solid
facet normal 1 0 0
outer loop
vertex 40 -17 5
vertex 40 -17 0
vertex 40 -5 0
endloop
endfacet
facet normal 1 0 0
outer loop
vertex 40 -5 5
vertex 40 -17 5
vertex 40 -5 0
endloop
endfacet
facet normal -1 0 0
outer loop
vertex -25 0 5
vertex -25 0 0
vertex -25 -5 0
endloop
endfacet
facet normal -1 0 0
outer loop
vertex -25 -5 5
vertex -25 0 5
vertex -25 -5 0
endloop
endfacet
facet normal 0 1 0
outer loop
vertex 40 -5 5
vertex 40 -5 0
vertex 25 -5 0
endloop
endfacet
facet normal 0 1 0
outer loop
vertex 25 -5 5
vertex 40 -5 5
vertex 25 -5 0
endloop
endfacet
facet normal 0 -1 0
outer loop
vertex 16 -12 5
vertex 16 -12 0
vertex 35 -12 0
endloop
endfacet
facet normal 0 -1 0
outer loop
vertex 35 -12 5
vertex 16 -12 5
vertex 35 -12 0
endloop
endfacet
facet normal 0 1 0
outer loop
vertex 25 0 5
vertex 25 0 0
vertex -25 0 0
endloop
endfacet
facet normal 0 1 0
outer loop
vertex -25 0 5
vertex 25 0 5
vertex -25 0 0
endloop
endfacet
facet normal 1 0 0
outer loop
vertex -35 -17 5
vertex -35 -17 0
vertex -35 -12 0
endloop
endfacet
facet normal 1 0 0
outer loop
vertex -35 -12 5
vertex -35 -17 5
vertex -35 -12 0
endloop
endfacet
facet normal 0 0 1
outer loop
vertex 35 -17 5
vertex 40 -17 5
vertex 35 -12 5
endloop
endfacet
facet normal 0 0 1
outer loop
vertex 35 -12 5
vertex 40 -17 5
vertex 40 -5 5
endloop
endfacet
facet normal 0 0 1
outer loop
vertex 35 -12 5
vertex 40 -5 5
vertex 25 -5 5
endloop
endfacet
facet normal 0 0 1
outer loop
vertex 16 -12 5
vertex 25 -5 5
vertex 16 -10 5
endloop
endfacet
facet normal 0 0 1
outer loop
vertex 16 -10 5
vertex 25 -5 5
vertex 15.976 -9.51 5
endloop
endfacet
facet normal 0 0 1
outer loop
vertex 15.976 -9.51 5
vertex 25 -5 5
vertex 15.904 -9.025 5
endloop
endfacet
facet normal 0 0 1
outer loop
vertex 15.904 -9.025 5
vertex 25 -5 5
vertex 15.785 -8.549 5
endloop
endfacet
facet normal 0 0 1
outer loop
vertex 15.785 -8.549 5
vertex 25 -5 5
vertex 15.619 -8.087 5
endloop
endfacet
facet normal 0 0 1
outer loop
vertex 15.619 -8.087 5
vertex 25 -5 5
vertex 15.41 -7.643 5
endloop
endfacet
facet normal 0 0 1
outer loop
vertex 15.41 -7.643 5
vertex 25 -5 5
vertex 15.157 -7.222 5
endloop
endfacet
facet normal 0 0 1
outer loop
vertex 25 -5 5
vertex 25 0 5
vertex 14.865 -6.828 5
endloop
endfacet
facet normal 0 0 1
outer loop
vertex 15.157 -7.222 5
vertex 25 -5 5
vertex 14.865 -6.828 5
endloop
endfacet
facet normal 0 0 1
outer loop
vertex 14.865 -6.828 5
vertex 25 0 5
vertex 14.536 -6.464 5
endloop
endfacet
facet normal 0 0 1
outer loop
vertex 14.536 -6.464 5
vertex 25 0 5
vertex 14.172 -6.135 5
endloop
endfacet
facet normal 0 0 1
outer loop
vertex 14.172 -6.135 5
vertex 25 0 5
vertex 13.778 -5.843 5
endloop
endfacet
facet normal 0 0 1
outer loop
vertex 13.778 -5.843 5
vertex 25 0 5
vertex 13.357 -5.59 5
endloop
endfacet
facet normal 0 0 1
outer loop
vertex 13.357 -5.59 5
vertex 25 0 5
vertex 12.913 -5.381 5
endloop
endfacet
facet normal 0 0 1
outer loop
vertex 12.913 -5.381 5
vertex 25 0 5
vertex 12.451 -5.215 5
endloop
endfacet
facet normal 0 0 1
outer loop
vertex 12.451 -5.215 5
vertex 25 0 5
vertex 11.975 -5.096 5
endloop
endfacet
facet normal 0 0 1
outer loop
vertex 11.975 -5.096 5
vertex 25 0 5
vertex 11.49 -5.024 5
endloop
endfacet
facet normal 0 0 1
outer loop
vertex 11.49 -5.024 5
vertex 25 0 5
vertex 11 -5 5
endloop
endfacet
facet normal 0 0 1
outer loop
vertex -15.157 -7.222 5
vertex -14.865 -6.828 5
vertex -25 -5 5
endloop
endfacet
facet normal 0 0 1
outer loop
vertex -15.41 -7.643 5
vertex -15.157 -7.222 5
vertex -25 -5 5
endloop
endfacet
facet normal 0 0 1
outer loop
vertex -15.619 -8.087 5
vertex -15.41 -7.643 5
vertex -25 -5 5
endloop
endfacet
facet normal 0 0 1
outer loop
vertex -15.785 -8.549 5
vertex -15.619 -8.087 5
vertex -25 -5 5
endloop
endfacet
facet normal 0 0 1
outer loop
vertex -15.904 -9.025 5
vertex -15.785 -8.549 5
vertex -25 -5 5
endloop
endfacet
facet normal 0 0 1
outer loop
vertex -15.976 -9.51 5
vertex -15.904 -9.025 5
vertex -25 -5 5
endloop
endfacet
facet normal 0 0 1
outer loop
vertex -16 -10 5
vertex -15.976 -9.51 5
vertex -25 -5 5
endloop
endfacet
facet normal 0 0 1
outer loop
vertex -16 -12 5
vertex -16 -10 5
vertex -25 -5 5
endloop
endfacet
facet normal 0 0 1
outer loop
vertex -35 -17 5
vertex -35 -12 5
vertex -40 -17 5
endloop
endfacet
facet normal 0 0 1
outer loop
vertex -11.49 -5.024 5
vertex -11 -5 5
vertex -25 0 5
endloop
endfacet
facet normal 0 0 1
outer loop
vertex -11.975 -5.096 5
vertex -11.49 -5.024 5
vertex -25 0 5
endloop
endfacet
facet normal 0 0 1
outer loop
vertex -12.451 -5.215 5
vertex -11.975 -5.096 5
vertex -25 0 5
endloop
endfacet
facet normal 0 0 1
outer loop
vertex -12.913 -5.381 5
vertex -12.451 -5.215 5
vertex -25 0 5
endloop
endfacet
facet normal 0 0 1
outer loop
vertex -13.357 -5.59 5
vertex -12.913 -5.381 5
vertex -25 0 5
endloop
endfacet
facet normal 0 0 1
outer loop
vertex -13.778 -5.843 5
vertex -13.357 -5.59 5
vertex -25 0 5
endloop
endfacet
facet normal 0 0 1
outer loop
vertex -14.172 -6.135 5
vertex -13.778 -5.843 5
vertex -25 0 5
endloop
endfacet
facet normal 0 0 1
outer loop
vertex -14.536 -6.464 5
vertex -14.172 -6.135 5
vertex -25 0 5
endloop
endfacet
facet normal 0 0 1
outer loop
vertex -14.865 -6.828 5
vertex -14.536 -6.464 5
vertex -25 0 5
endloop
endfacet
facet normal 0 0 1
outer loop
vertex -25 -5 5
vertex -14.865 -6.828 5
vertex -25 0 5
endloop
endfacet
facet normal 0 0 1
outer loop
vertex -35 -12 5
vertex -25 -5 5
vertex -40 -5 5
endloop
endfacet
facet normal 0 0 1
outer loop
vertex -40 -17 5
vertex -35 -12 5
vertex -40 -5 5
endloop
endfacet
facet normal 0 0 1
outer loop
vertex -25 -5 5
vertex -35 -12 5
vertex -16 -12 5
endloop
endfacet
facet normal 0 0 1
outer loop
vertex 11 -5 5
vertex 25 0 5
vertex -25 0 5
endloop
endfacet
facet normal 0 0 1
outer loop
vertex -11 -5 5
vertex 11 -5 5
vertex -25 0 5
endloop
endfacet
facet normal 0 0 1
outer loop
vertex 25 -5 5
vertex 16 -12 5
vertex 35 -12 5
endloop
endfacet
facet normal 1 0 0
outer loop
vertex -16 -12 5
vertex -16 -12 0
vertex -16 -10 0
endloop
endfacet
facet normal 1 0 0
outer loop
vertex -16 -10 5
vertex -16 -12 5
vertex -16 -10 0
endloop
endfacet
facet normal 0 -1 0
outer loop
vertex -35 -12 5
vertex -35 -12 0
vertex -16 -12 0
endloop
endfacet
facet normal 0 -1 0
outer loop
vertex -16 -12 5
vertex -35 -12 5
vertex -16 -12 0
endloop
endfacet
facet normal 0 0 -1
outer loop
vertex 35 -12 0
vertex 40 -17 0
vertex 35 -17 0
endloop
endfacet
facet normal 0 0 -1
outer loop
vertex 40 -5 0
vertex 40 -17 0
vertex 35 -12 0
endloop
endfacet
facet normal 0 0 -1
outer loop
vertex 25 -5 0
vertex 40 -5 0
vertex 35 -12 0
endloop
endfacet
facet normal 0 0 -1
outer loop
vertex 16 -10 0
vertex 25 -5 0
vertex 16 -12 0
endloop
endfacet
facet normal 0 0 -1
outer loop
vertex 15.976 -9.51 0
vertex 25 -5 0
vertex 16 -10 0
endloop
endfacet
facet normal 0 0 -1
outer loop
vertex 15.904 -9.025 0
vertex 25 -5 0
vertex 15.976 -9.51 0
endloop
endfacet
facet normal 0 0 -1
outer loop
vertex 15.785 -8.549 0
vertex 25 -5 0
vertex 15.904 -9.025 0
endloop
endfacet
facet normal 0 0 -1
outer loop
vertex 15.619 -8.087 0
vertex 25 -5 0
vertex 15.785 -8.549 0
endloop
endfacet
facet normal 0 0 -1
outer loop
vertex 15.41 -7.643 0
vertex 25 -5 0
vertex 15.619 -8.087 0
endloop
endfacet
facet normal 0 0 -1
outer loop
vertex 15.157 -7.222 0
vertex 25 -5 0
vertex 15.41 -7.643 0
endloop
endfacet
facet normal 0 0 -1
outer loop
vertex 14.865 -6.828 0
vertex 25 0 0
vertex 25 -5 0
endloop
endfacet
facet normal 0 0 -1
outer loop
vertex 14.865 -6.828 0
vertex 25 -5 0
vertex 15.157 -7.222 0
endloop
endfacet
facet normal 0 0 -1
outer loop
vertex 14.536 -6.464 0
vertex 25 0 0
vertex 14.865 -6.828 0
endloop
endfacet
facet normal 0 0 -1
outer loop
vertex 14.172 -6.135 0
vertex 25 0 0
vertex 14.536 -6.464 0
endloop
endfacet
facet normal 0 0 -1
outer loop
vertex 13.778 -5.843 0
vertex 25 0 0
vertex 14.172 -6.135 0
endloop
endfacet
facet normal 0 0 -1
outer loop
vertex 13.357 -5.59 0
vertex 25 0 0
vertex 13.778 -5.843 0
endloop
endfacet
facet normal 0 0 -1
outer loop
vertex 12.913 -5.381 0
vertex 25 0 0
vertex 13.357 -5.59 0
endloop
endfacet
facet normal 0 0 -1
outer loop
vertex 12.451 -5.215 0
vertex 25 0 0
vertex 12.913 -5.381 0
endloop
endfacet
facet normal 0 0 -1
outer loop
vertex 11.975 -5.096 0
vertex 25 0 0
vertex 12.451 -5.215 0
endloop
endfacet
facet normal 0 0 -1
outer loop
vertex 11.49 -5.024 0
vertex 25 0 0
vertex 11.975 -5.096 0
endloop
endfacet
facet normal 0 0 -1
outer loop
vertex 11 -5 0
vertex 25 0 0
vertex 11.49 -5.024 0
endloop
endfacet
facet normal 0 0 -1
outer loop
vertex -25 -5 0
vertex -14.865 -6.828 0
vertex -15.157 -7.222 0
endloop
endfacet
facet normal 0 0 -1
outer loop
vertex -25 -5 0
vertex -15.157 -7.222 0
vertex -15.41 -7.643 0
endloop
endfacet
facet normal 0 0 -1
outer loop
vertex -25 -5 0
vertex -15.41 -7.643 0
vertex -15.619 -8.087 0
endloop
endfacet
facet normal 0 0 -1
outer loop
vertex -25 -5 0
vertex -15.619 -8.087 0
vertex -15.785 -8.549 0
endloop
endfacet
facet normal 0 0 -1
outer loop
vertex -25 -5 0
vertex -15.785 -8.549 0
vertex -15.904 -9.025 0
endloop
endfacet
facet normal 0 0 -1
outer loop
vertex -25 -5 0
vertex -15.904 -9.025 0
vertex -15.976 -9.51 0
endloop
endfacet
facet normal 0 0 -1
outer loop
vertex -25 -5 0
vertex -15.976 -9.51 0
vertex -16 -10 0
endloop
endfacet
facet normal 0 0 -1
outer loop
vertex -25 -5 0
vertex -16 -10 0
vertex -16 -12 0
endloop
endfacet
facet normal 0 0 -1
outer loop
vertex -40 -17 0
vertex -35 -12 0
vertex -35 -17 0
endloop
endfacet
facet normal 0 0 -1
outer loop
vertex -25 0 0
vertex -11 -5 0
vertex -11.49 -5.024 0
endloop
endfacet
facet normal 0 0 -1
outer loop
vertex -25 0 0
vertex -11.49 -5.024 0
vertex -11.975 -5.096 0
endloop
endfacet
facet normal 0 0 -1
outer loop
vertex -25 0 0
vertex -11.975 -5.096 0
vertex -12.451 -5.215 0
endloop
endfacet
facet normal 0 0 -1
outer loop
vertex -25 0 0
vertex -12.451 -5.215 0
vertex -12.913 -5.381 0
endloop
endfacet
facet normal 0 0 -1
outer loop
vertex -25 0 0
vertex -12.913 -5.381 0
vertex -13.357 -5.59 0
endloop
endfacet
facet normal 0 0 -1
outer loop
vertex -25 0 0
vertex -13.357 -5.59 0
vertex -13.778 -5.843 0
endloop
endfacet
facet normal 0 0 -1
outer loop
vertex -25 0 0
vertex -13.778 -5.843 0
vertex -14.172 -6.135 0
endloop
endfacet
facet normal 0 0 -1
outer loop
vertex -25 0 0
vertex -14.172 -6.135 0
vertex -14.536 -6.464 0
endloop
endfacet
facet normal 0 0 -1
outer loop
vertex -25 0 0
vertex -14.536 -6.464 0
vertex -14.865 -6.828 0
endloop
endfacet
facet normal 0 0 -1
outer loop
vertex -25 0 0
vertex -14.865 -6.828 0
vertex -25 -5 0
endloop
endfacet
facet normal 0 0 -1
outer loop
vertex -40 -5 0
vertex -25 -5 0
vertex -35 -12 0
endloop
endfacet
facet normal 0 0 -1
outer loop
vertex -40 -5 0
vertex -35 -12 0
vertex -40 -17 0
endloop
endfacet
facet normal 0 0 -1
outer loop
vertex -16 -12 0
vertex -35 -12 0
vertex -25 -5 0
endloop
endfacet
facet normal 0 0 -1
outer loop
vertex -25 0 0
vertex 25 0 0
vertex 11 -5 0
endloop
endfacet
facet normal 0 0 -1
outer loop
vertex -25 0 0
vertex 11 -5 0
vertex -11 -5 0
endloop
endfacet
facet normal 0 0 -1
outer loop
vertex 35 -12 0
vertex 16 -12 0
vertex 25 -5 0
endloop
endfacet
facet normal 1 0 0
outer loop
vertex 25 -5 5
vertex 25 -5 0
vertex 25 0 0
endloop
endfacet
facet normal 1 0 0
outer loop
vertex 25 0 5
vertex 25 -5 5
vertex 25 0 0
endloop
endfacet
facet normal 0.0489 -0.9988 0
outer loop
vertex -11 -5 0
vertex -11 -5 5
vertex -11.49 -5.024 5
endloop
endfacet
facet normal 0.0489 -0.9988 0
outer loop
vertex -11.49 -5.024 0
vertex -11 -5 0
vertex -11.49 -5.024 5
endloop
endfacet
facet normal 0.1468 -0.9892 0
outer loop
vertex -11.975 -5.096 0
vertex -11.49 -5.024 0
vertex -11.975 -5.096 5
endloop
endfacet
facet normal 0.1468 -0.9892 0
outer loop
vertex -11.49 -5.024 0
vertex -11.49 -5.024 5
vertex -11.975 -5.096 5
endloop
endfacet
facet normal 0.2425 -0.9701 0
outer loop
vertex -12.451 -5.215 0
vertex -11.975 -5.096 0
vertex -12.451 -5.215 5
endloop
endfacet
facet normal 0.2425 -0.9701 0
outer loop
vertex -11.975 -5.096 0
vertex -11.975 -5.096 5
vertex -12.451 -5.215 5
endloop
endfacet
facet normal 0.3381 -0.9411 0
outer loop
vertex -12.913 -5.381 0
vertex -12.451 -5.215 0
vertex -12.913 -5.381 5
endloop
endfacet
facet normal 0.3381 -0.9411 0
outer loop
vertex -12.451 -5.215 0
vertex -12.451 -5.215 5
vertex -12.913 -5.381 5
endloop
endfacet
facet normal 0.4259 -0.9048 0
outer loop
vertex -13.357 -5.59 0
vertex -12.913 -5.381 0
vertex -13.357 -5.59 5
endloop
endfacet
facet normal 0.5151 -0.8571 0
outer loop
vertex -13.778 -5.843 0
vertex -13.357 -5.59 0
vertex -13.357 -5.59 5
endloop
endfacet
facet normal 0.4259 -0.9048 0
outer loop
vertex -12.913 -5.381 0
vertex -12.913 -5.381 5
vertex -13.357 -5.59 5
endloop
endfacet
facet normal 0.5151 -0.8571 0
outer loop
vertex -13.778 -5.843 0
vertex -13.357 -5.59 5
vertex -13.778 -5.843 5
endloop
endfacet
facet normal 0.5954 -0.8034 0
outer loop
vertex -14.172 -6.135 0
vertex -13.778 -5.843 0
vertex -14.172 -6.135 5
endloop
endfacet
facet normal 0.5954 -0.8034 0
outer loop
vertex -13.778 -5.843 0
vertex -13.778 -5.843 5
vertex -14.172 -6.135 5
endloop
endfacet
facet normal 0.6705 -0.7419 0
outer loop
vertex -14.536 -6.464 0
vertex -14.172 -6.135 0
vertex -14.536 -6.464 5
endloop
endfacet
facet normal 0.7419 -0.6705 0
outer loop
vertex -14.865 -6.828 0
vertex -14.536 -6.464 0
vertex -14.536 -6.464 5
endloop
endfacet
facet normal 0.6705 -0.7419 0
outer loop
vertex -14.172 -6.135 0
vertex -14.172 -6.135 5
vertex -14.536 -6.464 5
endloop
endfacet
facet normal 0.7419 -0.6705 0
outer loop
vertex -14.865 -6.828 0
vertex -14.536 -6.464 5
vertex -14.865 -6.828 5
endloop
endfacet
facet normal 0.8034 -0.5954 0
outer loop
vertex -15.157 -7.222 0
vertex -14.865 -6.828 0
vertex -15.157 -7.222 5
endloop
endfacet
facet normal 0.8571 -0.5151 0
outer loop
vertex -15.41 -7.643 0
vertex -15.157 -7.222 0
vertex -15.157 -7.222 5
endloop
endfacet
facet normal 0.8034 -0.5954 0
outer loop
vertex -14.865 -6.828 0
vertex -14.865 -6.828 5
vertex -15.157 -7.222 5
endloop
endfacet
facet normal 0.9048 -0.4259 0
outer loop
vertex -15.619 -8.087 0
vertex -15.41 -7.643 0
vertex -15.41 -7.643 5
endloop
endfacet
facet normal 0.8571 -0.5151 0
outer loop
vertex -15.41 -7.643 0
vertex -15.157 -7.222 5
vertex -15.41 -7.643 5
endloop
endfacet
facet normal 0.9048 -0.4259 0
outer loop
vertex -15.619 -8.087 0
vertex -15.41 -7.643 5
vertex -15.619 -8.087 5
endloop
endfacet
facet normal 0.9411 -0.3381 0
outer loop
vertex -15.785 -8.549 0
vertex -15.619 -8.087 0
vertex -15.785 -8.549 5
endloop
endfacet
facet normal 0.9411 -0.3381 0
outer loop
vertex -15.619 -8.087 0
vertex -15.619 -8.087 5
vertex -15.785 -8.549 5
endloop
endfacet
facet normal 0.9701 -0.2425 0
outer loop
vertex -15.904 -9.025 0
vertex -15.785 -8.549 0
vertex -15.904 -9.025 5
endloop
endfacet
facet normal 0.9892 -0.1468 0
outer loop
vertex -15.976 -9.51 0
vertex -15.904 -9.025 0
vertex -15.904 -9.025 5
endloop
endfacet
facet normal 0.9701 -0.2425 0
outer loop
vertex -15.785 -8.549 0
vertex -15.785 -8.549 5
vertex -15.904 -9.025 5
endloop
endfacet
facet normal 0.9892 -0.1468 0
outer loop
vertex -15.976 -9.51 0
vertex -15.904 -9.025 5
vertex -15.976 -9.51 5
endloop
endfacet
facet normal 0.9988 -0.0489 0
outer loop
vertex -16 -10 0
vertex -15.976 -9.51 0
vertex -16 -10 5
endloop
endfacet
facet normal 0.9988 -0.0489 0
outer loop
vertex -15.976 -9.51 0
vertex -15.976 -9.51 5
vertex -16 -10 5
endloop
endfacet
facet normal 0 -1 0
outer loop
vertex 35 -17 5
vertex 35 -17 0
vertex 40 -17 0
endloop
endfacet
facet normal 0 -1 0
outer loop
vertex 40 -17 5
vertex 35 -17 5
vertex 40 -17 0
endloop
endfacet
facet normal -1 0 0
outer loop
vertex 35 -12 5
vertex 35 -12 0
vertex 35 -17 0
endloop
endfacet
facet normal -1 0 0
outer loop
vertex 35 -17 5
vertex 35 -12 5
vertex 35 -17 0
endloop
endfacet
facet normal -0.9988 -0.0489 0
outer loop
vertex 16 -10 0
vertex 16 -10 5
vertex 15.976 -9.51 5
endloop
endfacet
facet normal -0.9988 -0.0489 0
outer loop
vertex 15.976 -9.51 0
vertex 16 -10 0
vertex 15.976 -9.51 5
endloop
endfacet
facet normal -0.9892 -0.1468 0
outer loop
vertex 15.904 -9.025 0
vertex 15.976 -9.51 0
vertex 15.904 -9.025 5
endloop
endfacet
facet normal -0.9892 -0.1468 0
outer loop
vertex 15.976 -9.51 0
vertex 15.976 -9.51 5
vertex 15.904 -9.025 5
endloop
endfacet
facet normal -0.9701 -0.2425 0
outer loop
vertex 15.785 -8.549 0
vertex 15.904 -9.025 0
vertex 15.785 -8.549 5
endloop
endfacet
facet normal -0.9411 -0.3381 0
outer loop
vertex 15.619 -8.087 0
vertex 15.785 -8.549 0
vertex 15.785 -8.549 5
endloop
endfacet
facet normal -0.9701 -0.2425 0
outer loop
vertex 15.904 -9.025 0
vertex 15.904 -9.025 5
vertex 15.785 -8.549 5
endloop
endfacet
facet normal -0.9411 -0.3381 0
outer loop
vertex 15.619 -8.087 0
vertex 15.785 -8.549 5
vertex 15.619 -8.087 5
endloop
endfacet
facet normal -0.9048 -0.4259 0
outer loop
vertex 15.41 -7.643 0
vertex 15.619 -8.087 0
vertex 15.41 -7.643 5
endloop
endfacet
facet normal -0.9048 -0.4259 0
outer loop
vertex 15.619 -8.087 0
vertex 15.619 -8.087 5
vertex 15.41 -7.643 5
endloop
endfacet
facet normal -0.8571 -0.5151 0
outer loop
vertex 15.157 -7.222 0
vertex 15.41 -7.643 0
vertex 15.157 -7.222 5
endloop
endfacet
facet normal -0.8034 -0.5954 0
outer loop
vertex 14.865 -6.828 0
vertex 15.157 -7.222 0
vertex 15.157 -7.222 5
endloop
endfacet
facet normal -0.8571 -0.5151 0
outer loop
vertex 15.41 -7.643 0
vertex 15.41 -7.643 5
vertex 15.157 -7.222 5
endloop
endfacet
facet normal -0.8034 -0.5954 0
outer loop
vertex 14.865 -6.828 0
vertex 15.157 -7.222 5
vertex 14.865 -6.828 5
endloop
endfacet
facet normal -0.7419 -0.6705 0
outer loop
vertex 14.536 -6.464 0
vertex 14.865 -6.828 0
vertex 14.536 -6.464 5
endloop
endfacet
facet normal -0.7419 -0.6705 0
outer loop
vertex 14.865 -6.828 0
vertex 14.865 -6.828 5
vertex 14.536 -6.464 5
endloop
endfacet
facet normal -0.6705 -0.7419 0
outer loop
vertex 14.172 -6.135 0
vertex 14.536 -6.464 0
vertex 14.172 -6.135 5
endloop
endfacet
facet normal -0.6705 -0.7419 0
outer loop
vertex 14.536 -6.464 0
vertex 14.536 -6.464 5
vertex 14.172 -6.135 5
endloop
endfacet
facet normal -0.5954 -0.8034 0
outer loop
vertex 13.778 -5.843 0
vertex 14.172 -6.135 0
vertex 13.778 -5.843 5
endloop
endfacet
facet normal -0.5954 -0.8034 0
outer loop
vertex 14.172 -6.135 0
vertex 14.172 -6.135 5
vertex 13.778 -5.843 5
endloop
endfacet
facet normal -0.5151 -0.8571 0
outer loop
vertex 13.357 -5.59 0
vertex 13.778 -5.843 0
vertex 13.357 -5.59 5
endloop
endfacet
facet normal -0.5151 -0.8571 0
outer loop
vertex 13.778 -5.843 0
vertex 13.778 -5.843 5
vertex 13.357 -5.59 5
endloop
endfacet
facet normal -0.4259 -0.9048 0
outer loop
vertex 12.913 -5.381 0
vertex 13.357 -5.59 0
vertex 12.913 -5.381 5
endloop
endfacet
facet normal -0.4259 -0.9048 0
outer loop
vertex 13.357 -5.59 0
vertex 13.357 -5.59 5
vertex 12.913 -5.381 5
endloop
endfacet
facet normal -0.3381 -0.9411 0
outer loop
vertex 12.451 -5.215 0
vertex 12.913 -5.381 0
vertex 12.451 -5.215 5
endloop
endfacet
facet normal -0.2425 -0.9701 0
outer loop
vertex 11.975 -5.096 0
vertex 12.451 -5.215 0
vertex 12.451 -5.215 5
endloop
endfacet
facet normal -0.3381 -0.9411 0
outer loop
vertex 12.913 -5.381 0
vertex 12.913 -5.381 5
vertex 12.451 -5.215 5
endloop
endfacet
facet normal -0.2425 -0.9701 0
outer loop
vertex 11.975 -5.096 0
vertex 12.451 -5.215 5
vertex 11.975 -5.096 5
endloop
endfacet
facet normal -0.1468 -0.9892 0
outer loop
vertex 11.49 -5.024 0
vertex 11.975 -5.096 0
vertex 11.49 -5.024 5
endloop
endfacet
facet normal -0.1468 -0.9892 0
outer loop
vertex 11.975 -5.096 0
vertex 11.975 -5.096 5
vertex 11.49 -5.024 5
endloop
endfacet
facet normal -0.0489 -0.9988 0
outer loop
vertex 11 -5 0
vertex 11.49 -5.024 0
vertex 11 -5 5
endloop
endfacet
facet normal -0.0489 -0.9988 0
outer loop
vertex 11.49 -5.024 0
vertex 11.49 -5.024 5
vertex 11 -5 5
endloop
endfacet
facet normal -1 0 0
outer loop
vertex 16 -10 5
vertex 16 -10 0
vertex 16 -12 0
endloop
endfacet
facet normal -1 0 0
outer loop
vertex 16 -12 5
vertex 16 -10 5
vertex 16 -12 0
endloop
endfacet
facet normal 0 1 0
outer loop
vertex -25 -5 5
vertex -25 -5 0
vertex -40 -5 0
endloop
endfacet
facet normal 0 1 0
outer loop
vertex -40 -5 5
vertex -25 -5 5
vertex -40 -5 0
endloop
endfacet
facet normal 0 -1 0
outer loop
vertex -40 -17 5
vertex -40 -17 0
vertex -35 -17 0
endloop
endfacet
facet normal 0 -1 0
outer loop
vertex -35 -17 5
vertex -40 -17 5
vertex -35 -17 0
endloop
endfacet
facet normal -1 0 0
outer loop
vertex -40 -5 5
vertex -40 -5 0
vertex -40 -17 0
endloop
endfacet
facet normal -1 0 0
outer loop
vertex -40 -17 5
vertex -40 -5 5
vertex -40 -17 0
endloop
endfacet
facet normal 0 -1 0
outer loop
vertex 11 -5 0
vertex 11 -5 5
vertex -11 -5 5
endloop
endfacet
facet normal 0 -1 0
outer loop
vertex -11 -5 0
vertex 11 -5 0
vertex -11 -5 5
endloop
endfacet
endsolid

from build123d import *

# Parameters (mm, degrees)
BOSS_EXTRU_1_DEPTH = 5
BOSS_EXTRU_2_DEPTH = 5


with BuildPart() as part:
    # Esquisse1 → Boss.-Extru.1 (new body)
    with BuildSketch(Plane.XY):
        Polygon((-16, -12), (-16, -5), (16, -5), (16, -12), (35, -12), (35, -17), (40, -17), (40, -5), (25, -5), (25, 0), (-25, 0), (-25, -5), (-40, -5), (-40, -17), (-35, -17), (-35, -12), align=None)
    extrude(amount=BOSS_EXTRU_1_DEPTH)

    # Esquisse2 → Boss.-Extru.2 (add)
    with BuildSketch(Plane.XY.offset(5)):
        with BuildLine():
            Line((-16, -10), (-16, -3.900376605))
            Line((-16, -3.900376605), (16, -3.900376605))
            Line((16, -3.900376605), (16, -10))
            ThreePointArc((16, -10), (14.535533906, -6.464466094), (11, -5))
            Line((11, -5), (-11, -5))
            ThreePointArc((-11, -5), (-14.535533906, -6.464466094), (-16, -10))
        make_face()
    extrude(amount=-BOSS_EXTRU_2_DEPTH)


solid = part.part
